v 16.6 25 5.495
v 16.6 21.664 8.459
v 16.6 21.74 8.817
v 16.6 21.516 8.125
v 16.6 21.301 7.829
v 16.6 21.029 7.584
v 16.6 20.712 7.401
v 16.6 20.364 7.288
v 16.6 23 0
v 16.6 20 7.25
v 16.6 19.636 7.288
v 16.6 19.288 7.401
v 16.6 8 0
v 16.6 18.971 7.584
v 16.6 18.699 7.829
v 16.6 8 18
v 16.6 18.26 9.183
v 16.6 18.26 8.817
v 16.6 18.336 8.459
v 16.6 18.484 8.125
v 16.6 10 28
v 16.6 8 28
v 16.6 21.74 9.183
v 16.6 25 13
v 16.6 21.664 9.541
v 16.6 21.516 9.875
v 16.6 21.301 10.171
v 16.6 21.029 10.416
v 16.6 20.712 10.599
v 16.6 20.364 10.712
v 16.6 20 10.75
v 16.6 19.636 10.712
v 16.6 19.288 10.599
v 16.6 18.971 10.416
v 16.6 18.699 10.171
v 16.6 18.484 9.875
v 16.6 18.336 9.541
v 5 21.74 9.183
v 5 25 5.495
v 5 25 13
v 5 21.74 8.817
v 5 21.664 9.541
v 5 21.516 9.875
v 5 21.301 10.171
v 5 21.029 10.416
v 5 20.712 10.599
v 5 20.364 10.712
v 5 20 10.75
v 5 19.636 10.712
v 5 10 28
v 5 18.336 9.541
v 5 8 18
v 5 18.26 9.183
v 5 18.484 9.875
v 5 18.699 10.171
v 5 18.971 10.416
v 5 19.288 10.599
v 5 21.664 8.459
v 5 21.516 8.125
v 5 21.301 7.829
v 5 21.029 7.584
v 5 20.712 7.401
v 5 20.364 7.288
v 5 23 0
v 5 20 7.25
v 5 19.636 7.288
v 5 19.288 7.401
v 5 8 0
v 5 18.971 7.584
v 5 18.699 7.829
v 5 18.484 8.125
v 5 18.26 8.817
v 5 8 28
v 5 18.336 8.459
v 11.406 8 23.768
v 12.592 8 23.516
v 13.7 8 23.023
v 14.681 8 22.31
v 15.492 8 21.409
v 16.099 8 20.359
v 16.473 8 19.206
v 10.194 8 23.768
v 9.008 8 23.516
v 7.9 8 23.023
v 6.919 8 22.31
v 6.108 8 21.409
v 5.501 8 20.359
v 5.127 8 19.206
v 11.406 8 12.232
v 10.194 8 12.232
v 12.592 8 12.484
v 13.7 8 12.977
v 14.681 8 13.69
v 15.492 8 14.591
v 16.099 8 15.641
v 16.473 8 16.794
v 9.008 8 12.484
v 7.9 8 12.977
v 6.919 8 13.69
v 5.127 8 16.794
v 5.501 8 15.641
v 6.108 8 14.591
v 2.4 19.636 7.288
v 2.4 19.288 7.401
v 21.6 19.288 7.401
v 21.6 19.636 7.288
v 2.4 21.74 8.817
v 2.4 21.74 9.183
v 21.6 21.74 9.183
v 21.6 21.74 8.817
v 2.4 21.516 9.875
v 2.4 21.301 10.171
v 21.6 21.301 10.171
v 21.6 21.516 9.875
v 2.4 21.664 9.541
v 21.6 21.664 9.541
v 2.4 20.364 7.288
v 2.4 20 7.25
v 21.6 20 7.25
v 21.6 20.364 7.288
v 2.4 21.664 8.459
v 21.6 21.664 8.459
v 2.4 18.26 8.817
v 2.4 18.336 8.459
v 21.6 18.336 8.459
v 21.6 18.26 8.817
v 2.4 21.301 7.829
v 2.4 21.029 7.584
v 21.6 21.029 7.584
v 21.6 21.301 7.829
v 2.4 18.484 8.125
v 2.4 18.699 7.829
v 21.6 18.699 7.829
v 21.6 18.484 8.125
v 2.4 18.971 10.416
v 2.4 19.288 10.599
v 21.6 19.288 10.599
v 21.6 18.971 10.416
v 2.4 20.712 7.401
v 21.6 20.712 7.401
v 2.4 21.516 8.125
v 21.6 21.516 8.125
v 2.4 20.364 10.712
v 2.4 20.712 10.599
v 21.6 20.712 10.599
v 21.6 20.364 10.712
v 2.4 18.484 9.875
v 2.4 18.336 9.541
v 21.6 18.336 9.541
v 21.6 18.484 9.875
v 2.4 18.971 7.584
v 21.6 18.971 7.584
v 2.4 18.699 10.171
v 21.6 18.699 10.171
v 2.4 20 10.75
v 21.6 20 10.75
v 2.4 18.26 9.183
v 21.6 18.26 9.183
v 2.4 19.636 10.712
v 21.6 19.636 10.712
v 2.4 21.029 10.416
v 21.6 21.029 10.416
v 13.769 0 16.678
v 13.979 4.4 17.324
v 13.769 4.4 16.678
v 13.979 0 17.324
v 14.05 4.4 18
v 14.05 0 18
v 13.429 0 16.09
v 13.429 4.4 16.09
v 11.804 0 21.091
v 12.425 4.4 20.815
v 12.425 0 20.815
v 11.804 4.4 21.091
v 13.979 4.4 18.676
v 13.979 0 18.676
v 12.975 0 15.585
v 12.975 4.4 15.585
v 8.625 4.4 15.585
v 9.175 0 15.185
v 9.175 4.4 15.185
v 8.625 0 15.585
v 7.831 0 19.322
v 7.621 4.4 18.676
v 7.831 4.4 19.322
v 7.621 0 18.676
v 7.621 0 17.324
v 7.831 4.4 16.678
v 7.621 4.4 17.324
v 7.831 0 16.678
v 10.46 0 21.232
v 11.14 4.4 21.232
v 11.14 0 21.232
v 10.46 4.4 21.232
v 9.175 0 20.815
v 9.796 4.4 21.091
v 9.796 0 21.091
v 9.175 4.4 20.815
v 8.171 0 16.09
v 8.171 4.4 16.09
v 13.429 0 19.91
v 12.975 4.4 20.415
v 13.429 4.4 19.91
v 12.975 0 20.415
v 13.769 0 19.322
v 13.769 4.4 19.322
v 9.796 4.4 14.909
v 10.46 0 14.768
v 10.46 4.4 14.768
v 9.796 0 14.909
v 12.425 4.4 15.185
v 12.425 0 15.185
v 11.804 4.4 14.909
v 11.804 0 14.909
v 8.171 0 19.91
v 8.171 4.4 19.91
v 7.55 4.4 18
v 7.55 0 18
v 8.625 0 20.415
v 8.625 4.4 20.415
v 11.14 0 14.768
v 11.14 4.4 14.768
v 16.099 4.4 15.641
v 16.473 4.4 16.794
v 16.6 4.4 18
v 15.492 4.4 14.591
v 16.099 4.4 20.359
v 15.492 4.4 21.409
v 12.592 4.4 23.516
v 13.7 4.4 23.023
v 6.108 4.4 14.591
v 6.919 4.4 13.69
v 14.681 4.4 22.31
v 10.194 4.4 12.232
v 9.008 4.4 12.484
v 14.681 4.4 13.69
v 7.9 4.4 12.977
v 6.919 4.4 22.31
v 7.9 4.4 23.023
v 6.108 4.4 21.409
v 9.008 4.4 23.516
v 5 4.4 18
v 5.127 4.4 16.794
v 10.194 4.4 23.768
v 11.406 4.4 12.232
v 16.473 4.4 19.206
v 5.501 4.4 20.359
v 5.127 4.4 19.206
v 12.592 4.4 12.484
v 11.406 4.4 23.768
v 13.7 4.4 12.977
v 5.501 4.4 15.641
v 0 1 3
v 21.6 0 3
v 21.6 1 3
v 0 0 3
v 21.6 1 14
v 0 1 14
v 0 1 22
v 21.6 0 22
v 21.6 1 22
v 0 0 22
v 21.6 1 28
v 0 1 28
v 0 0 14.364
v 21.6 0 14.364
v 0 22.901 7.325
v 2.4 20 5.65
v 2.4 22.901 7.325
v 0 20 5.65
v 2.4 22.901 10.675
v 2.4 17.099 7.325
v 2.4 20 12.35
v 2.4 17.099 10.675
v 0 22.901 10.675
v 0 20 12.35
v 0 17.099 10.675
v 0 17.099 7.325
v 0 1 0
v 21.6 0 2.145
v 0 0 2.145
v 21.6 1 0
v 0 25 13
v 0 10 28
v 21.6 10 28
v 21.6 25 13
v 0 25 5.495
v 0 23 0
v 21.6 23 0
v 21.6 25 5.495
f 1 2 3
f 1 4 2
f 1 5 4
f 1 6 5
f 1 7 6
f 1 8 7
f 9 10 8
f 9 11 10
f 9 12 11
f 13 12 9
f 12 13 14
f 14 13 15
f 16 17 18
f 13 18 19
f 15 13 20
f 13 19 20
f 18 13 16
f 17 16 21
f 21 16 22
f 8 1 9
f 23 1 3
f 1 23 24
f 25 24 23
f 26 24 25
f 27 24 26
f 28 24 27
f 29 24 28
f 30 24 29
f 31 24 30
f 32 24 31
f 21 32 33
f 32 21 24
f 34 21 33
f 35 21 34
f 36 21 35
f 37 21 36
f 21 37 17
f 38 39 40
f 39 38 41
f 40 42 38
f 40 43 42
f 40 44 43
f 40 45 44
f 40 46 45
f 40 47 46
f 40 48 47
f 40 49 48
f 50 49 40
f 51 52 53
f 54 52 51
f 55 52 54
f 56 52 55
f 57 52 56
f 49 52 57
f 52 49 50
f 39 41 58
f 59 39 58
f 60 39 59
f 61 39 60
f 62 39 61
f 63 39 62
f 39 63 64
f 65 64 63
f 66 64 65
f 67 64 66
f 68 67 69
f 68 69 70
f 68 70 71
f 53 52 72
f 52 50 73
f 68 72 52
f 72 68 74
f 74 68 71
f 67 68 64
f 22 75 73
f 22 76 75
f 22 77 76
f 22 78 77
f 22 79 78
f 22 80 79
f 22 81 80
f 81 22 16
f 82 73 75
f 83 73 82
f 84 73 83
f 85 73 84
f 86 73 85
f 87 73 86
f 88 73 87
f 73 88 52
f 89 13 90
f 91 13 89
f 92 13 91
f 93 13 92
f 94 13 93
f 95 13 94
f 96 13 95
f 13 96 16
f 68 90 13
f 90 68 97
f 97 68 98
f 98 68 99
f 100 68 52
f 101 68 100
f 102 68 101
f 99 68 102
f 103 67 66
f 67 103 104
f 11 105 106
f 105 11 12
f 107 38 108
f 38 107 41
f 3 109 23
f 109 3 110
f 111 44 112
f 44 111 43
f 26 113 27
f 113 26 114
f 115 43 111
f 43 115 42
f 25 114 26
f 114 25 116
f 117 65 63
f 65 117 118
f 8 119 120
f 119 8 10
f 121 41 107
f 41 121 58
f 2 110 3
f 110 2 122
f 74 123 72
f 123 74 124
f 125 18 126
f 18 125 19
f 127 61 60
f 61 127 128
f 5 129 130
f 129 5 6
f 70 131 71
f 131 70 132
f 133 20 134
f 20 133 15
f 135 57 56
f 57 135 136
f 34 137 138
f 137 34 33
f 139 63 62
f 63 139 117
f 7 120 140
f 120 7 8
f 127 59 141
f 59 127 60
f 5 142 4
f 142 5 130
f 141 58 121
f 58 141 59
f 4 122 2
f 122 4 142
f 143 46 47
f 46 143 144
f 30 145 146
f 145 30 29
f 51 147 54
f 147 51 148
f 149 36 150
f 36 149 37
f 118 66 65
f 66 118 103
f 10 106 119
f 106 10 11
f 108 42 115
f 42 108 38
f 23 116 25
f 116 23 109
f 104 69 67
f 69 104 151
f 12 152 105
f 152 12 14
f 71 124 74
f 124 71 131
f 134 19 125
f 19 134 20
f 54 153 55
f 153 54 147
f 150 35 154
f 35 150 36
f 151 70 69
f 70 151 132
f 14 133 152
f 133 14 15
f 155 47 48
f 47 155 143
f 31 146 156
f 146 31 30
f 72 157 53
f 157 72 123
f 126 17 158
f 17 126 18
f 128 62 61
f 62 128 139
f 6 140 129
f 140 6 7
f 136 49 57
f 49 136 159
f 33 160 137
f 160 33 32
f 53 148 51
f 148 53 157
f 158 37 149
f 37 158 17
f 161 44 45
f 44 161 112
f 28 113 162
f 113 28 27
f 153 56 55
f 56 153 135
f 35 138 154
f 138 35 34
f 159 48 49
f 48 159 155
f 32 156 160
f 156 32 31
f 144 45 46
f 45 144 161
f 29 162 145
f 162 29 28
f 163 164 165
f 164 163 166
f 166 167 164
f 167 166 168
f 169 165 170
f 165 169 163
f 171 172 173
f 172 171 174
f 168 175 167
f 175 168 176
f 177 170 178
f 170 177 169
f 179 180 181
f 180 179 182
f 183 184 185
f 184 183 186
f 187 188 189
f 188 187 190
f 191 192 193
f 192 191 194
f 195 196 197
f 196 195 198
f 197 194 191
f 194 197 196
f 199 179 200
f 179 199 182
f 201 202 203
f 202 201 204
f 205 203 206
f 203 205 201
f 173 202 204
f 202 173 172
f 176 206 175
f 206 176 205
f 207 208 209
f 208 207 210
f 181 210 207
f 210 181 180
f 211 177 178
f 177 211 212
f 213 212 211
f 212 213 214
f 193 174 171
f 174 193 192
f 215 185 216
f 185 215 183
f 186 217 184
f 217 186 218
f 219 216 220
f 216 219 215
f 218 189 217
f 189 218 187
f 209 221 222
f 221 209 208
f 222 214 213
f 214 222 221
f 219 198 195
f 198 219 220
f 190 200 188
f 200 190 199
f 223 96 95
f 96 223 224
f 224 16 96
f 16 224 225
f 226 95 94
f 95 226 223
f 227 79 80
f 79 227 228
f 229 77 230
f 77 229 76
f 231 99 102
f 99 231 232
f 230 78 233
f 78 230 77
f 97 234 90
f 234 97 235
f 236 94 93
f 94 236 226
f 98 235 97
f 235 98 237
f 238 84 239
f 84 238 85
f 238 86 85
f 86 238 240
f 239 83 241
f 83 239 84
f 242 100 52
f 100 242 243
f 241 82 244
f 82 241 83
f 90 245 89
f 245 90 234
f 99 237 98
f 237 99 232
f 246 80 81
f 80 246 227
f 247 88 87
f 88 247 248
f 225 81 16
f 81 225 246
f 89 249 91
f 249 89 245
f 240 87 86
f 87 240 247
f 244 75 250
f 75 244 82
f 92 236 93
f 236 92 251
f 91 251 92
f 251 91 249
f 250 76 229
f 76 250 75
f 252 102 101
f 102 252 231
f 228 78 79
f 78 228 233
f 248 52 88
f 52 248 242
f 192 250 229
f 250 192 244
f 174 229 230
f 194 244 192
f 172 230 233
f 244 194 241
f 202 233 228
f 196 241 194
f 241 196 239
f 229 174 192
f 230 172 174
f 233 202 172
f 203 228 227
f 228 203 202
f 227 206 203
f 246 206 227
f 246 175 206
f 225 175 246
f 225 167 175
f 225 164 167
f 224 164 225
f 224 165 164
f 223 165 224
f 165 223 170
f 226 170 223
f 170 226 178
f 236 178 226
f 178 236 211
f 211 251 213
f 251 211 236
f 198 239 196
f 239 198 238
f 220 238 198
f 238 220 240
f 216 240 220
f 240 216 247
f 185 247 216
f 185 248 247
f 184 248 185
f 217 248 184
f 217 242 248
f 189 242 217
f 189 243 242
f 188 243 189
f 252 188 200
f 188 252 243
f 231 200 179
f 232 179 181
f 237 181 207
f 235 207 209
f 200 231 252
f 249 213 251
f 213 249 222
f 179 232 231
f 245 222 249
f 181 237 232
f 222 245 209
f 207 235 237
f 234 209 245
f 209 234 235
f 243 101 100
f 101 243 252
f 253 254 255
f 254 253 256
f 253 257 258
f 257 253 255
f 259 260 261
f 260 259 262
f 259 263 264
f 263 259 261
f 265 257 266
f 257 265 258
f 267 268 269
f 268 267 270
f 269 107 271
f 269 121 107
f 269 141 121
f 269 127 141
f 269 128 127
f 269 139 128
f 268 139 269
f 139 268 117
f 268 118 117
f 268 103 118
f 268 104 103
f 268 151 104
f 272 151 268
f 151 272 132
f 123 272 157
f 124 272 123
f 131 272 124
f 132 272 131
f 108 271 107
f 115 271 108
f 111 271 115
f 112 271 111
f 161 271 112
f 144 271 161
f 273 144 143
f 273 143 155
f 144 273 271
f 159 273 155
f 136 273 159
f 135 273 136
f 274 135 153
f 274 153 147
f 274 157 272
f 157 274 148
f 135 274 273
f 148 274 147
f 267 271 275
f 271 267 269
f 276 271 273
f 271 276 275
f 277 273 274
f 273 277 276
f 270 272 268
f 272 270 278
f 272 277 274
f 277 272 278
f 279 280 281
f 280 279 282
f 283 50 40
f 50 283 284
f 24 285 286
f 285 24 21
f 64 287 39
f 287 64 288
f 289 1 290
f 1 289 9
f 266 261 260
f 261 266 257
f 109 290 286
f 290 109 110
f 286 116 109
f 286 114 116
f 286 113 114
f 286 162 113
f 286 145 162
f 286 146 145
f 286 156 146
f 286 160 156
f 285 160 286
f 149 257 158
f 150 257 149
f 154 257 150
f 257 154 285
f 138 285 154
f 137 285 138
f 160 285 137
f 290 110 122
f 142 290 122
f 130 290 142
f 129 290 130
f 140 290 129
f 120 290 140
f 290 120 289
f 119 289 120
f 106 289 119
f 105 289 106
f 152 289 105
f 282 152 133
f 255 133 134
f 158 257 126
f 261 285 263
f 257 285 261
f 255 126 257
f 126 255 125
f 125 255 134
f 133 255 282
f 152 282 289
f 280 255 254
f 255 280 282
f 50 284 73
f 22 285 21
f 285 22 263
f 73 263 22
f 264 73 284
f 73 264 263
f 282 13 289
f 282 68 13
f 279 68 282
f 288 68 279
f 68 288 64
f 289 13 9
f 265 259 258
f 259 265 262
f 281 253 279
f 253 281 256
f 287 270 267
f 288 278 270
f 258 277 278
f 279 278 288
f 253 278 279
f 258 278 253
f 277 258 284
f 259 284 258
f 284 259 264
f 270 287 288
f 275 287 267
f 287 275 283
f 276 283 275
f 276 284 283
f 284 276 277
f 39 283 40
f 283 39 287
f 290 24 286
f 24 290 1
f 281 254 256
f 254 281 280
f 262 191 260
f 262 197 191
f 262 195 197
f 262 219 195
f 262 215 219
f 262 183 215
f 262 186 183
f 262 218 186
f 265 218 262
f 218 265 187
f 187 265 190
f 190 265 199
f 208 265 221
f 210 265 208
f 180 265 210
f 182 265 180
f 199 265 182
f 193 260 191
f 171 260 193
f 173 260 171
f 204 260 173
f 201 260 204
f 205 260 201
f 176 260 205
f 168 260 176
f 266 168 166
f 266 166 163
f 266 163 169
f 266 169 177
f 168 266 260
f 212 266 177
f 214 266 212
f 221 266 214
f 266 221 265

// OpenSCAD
// file: ../configuration.scad
// Layer high for the printing [mm]
layer_height = 0.25; //Slic3r->Print Settings->Layers and perimeters->Layer height

// Spare for the screws heads [mm]
spare = 1;
// M6 screw diameter [mm]
M6_head_diameter = 10.6+spare;
//M6_head_diameter = 12+spare;

// M6 head high (for hiding it) [mm]
M6_head_height = 3.6;
//M6_head_height = 4.5;

// Screws and rods diameters
M8_smooth_rod_diameter = 8.3;
M8_smooth_rod_diameter_catch = 8.8;
M6_diameter = 6.6;
M6_diamater_horizontal = 6.5;
M3_diameter = 3.7;
M3_diameter_horizontal = 3.5;

// Nuts diameters
M3_nut_diameter = 7.0;
M3_nut_diameter_horizontal = 6.7;

// ALU profile parameters
ALU_cut_width = 7.9;
ALU_cut_width_horizontal = 7.7;

// Motors length/depth (for axes Z and Y)
//SX17-1003LQFE (recommended for the Z axis)
//motor_length = 29.5;
//SX17-1003 (recommended for the Z axis)
motor_length = 34;
//SX17-1005
//motor_length = 40;
//SX17-0905 - this motor is too high - the Z end stop holder has to be adjusted
//motor_length = 48;

// Extrusion width [mm]
extrusion_width = 0.66; //Slic3r->Print Settings->Advanced->Default extrusion width

/// Belt type ******************************************************

// GT2 
//belt_tooth_distance = 2;
//belt_tooth_ratio = 0.5;

// T2.5
belt_tooth_distance = 2.5;
belt_tooth_ratio = 0.68;
// main file
// RebeliX
//
// y idler
// GNU GPL v3
// Martin Neruda <neruda@reprap4u.cz>
// http://www.reprap4u.cz
// Inspired by Rebel II

include <../configuration.scad>

wall = 5;
height = 28;
depth = 25;
width = M6_head_diameter+2*wall;
base_thickness = 8;

module y_idler_base(){
	cube([width,depth,height]);
}

module y_idler_cuts(){
	// Bearing hole
	translate([wall,base_thickness,-0.1]) cube([M6_head_diameter,depth,height+1]);
	// Screw and bearing hole
	translate([-0.1,depth-5,9]) rotate([0,90,0]) cylinder(r = M3_diameter_horizontal/2, h = width+1, $fn = 30);
	// Mount hole
	translate([width/2,-0.1,3+15]) rotate([-90,0,0]) cylinder(r = M6_diamater_horizontal/2, h = depth, $fn = 30);
	// M6 screw hole
	translate([width/2,base_thickness-M6_head_height,3+15]) rotate([-90,0,0]) cylinder(r = M6_head_diameter/2, h = depth, $fn = 30);
	// ALU profile cutout
	translate([-0.1,-0.1,3]) cube([width+1,1.1,15-4]);
	translate([-0.1,-0.1,3+15+4]) cube([width+1,1.1,15-4]);
	translate([-0.1,1,3+15-4]) rotate([160,0,0]) cube([30,3,8]); 
	// Nut hole
	translate([-0.1,depth-5,9]) rotate([0,90,0]) cylinder(h = 2.5, r=M3_nut_diameter_horizontal/2, $fn=6);	
	// Material saving
	translate([-0.1,1,0]) rotate([115,0,0]) cube([width+1,6,6]);
	translate([-0.1,depth,13]) rotate([45,0,0]) cube([width+1,depth+2,height]);
	translate([-0.1,depth-2,0]) rotate([-20,0,0]) cube([width+1,10,10]);
	
	// Bearing
	%translate([5,depth-5,9]) rotate([0,90,0]) cylinder(r = 11, h = width-10, $fn = 30);
}

difference(){
	y_idler_base();
	y_idler_cuts();
}	
